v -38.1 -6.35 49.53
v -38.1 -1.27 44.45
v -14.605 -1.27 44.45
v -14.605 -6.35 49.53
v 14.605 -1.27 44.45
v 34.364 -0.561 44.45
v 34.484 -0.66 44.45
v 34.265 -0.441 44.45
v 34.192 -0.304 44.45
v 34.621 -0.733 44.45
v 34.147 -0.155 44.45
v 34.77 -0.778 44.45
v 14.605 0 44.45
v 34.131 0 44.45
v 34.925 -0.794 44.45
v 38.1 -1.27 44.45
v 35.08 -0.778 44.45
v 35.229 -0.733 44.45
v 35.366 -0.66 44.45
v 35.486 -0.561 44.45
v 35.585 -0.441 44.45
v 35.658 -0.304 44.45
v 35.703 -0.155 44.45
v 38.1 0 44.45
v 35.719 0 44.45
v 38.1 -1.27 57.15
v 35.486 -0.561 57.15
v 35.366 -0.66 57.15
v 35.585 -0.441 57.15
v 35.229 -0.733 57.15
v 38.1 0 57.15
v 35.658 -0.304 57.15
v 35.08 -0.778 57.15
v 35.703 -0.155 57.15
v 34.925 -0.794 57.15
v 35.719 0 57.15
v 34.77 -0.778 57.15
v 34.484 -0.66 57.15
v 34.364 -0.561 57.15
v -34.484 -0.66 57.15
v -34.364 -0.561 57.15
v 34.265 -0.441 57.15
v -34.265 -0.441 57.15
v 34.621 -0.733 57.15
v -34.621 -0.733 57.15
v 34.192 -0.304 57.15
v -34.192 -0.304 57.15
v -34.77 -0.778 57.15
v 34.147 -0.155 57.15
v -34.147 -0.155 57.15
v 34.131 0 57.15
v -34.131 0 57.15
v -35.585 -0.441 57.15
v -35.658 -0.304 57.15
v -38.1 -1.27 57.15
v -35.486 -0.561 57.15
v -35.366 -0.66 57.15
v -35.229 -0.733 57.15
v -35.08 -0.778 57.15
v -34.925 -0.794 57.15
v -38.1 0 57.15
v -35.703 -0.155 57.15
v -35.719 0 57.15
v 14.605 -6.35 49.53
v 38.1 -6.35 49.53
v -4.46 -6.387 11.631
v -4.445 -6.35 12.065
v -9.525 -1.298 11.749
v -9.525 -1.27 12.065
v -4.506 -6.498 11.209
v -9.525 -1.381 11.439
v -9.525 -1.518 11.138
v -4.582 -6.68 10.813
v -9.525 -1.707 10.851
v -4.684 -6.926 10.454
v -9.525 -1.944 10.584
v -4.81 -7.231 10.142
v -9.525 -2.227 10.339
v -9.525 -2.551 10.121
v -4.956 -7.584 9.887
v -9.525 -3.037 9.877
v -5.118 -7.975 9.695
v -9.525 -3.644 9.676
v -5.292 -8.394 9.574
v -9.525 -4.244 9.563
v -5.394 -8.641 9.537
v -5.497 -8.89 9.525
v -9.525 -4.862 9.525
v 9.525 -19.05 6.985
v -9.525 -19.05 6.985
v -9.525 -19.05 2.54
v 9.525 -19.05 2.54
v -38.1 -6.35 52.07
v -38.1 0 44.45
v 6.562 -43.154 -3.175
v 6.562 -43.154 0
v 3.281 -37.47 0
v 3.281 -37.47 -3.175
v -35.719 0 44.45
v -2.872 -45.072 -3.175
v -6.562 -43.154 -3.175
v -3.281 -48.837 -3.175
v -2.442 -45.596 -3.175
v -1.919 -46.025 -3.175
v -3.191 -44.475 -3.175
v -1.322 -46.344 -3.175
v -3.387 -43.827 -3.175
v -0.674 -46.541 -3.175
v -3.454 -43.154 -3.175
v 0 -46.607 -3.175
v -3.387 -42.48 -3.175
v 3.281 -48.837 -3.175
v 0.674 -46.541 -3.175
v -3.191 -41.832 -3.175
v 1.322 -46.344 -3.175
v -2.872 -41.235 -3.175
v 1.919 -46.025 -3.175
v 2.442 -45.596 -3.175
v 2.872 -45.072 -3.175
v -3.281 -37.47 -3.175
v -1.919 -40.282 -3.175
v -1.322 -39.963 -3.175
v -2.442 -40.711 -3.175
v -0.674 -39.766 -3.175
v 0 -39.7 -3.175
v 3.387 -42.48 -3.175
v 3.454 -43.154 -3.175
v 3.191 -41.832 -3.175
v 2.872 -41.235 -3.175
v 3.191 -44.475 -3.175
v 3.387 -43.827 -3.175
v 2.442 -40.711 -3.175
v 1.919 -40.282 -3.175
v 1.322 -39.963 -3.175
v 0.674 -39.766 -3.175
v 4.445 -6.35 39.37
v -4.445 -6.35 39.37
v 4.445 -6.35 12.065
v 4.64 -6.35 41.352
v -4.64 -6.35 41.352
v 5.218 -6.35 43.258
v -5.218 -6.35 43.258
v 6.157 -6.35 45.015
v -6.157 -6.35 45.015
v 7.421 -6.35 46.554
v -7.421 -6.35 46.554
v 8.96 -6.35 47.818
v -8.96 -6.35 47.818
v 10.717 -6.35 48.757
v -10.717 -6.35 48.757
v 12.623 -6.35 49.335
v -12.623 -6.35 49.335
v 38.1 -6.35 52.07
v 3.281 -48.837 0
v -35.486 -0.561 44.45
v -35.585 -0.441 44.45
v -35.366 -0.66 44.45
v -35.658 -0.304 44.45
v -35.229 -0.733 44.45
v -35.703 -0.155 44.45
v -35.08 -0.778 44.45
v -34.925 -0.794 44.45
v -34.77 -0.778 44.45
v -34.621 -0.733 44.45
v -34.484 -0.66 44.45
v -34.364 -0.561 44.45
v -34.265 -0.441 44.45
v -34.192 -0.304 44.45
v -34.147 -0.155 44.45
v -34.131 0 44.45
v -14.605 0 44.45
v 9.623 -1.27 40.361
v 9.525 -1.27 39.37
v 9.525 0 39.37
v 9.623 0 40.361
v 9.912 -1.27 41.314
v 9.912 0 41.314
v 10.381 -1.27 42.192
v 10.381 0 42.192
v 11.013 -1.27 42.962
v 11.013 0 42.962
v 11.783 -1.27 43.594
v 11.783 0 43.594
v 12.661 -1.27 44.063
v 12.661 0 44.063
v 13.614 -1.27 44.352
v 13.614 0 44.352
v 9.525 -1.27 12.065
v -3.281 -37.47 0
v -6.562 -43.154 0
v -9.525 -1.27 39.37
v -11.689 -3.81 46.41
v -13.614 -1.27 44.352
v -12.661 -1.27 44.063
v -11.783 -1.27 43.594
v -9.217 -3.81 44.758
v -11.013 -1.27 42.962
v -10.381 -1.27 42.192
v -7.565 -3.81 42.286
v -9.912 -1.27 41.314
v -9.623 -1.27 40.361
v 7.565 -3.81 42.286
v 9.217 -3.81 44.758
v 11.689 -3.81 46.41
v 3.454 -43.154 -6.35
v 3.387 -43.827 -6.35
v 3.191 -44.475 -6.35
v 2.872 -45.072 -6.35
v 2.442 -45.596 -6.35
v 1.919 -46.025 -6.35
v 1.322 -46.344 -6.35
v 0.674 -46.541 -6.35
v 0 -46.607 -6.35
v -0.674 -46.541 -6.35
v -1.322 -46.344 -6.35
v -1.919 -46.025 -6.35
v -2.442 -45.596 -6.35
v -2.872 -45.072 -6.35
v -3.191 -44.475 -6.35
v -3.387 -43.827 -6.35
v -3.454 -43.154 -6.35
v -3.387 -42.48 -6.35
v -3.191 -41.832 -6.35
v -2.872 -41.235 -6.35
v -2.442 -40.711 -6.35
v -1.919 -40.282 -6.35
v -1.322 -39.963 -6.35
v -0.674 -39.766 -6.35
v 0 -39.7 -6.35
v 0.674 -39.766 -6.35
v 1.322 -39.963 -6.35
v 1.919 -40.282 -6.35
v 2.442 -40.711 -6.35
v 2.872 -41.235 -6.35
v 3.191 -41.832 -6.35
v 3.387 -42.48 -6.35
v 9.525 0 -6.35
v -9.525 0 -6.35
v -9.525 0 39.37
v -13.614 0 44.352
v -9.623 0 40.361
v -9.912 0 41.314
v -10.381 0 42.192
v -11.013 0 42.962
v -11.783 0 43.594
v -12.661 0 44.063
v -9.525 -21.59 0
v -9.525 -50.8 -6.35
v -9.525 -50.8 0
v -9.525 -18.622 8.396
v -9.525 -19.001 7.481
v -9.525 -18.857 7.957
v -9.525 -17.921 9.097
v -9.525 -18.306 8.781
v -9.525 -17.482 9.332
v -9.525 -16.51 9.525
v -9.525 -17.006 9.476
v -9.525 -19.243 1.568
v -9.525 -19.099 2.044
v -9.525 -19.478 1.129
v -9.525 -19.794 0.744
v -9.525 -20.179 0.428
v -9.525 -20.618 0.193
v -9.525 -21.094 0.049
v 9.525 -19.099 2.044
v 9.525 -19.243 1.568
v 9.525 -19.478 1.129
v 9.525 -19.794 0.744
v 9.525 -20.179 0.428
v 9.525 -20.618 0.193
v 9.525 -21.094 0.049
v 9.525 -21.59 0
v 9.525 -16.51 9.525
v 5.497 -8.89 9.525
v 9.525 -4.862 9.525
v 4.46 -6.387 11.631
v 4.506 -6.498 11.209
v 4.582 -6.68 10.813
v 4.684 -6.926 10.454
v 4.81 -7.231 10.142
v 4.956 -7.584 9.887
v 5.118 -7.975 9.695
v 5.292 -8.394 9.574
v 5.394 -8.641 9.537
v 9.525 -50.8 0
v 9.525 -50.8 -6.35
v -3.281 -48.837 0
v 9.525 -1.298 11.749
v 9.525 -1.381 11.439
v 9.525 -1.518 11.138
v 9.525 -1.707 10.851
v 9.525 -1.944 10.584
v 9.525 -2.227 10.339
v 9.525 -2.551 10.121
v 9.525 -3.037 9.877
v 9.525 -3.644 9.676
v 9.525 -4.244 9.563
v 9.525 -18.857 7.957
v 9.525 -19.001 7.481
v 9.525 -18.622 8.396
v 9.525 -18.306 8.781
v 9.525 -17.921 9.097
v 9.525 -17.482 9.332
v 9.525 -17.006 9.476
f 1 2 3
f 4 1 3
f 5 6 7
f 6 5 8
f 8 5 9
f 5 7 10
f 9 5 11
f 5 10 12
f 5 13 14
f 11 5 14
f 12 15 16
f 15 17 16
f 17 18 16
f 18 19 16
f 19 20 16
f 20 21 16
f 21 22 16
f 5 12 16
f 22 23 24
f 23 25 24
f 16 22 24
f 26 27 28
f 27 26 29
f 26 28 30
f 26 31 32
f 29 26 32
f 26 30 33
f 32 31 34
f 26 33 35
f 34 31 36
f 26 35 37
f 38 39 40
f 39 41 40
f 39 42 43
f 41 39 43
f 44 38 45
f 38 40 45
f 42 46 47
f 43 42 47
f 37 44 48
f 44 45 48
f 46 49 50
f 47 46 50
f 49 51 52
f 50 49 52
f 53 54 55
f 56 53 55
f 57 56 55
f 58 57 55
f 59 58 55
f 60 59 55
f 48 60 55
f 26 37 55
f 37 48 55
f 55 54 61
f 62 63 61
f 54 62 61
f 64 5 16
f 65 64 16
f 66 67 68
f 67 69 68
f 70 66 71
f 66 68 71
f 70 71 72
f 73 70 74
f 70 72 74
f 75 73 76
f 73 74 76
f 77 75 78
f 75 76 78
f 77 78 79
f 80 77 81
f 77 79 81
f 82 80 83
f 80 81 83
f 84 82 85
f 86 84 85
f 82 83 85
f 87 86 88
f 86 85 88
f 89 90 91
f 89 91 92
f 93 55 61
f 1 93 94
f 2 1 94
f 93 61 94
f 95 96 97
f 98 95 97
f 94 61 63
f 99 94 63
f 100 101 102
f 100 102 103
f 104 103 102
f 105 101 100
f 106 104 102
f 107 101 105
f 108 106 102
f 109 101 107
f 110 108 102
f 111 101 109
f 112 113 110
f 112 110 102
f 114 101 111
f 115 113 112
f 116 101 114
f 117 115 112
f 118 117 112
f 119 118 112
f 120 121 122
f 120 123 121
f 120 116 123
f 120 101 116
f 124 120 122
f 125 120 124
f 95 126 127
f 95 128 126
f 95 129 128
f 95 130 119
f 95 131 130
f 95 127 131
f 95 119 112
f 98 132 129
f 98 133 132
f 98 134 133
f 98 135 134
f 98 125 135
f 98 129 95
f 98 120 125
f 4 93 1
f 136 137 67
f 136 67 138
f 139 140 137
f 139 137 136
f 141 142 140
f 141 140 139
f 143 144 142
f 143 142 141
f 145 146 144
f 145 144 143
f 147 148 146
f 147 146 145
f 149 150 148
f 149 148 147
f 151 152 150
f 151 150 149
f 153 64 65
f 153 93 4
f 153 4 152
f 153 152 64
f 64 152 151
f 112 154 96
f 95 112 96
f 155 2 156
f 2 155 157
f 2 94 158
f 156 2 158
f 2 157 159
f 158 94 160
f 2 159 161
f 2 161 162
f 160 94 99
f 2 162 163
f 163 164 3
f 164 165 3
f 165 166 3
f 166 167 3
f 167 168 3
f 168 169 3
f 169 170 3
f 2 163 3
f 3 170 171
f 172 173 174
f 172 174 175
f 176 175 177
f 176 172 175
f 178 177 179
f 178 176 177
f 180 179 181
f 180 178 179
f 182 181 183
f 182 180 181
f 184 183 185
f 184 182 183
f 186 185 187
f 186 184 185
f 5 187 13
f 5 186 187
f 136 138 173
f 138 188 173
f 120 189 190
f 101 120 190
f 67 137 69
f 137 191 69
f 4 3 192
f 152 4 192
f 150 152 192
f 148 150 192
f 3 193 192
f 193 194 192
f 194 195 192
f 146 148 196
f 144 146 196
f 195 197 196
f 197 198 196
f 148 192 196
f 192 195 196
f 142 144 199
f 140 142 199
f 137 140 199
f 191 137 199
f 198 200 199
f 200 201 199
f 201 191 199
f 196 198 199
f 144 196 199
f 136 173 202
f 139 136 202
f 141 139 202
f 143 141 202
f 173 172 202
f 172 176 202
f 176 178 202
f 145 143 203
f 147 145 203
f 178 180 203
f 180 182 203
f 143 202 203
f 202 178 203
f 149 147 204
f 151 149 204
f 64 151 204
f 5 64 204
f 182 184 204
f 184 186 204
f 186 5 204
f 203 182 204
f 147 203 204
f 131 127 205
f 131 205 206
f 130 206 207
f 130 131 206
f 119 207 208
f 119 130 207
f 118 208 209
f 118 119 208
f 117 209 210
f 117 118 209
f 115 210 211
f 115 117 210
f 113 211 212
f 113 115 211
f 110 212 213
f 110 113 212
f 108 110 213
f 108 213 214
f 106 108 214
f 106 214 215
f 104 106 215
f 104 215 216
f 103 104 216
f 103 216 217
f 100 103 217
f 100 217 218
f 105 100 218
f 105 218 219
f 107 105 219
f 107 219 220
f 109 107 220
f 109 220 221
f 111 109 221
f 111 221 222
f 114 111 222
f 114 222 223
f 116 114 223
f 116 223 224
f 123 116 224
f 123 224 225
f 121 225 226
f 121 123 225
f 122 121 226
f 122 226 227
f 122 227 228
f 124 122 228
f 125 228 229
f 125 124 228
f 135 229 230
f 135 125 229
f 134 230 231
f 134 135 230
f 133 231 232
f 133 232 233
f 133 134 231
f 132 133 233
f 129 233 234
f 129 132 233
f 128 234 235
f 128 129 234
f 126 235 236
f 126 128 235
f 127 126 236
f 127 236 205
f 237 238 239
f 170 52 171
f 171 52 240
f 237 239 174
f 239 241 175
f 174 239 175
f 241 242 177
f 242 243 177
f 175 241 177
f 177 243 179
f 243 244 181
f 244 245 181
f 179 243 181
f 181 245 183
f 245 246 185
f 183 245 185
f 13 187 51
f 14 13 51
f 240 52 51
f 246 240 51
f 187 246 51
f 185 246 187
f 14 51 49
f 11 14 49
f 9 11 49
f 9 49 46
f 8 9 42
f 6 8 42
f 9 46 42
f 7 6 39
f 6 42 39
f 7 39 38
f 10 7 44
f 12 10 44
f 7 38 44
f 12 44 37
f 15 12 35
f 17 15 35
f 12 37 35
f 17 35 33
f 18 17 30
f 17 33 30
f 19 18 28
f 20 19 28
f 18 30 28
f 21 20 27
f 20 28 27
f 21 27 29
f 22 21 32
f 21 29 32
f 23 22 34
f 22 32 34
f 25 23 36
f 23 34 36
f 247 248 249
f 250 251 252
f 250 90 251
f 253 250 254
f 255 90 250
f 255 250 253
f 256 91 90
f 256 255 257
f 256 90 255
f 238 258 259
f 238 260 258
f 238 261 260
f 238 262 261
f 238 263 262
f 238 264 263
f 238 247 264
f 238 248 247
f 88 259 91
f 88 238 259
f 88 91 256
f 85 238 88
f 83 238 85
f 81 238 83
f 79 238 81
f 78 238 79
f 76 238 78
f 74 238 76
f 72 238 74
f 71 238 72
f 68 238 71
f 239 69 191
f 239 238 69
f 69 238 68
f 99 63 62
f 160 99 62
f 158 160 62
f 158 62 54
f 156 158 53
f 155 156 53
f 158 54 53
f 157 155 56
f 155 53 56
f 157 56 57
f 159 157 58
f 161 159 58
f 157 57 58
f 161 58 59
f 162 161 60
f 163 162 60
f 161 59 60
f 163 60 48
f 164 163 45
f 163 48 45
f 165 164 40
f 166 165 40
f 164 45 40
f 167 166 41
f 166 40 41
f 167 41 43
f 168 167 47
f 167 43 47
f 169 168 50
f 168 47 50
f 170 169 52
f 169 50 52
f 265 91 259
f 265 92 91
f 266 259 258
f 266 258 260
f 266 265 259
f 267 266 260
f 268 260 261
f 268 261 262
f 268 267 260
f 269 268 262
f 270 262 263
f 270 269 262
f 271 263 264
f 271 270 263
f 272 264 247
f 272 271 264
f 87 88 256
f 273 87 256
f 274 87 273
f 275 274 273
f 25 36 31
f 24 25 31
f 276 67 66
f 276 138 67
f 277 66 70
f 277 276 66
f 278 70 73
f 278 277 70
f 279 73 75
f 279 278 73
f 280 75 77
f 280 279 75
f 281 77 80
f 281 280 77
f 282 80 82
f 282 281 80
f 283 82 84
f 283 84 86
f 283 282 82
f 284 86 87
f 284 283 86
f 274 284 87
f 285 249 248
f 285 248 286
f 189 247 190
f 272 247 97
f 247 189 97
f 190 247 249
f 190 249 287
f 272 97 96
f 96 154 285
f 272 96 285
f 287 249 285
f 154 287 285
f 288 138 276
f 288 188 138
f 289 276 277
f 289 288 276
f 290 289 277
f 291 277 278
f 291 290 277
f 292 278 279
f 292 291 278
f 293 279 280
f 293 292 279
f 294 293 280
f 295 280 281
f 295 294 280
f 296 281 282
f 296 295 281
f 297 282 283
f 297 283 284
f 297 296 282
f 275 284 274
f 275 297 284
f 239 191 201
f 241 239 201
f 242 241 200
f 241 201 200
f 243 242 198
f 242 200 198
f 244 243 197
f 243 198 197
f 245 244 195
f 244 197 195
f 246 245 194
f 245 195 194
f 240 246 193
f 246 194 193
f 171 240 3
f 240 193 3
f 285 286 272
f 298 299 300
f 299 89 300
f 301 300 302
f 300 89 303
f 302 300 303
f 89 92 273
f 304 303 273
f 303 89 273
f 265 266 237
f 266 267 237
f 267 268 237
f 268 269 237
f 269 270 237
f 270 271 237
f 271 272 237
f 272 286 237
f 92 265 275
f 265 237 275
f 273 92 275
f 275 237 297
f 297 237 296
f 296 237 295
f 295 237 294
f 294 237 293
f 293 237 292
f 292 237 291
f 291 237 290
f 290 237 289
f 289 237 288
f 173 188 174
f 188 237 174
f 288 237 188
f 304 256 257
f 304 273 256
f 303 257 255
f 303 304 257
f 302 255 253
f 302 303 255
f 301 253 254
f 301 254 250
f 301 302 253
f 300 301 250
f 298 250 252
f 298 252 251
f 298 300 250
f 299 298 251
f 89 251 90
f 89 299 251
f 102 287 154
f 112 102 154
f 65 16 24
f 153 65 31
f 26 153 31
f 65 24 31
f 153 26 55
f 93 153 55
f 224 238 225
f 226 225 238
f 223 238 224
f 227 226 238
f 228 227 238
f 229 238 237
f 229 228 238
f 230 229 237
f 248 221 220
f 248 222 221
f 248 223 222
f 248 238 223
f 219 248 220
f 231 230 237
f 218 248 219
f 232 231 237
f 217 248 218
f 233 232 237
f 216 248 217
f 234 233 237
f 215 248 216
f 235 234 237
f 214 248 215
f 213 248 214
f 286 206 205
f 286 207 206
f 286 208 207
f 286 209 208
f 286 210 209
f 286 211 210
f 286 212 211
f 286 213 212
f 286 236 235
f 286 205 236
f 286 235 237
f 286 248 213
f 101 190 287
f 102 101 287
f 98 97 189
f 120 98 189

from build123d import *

# Parameters (mm, degrees)
F1_DEPTH  = 6.35
F2_W      = 19.05
F2_H      = 50.8
F2_R      = 3.4537028987
F3_DEPTH  = 6.35
F4_W      = 19.05
F4_H      = 9.525
F5_DEPTH  = 12.7
F6_R      = 2.54
F7_R      = 3.4537028987
F8_DEPTH  = 3.175
F9_R      = 5.08
F10_SIZE  = 5.08
F11_R     = 2.54
F12_R     = 0.79375
F13_DEPTH = 25.4


with BuildPart() as f1:
    # F0 (on Front) → F1 (new body)
    with BuildSketch(Plane.XZ):
        Polygon((38.1, 57.15), (-38.1, 57.15), (-38.1, 44.45), (-9.525, 44.45), (-9.525, 0), (0, 0), (9.525, 0), (9.525, 44.45), (38.1, 44.45), align=None)
    extrude(amount=F1_DEPTH)

    # F2 (on face) → F3 (join)
    with BuildSketch(Plane(origin=(0, 0, 0), x_dir=(1, 0, 0), z_dir=(0, 0, -1))):
        with Locations((0, 25.4)):
            Rectangle(F2_W, F2_H)
        with Locations((0, 43.1535504758)):
            Circle(F2_R, mode=Mode.SUBTRACT)
    extrude(amount=F3_DEPTH)

    # F4 (on face) → F5 (join)
    with BuildSketch(Plane.XZ.offset(6.35)):
        with Locations((0, 4.7625)):
            Rectangle(F4_W, F4_H)
    extrude(amount=F5_DEPTH)

    # F6
    f6_edges = [f1.edges().sort_by_distance(p)[0] for p in [
        (0, -19.05, 9.525),
        (0, -19.05, 0),
    ]]
    fillet(f6_edges, radius=F6_R)

    # F7 (on face) → F8 (cut)
    with BuildSketch(Plane.XY):
        Polygon((-6.5624518347, -43.1535504758), (-3.2812259174, -48.8368004758), (3.2812259174, -48.8368004758), (6.5624518347, -43.1535504758), (3.2812259174, -37.4703004758), (-3.2812259174, -37.4703004758), align=None)
        with Locations((0, -43.1535504758)):
            Circle(F7_R, mode=Mode.SUBTRACT)
    extrude(amount=-F8_DEPTH, mode=Mode.SUBTRACT)

    # F9
    f9_edges = [f1.edges().sort_by_distance(p)[0] for p in [
        (-9.525, -3.175, 44.45),
        (9.525, -3.175, 44.45),
    ]]
    fillet(f9_edges, radius=F9_R)

    # F10
    f10_edges = [f1.edges().sort_by_distance(p)[0] for p in [
        (0, -6.35, 57.15),
        (-26.3525, -6.35, 44.45),
        (11.012898, -6.35, 42.962102),
    ]]
    chamfer(f10_edges, length=F10_SIZE)

    # F11
    f11_edges = [f1.edges().sort_by_distance(p)[0] for p in [
        (-6.985, -3.81, 9.525),
        (6.985, -3.81, 9.525),
        (0, -6.35, 9.525),
    ]]
    fillet(f11_edges, radius=F11_R)

    # F12 (on face) → F13 (cut)
    with BuildSketch(Plane.XY.offset(57.15)):
        with Locations((34.925, 0)):
            Circle(F12_R)
        with Locations((-34.925, 0)):
            Circle(F12_R)
    extrude(amount=-F13_DEPTH, mode=Mode.SUBTRACT)


solid = f1.part
